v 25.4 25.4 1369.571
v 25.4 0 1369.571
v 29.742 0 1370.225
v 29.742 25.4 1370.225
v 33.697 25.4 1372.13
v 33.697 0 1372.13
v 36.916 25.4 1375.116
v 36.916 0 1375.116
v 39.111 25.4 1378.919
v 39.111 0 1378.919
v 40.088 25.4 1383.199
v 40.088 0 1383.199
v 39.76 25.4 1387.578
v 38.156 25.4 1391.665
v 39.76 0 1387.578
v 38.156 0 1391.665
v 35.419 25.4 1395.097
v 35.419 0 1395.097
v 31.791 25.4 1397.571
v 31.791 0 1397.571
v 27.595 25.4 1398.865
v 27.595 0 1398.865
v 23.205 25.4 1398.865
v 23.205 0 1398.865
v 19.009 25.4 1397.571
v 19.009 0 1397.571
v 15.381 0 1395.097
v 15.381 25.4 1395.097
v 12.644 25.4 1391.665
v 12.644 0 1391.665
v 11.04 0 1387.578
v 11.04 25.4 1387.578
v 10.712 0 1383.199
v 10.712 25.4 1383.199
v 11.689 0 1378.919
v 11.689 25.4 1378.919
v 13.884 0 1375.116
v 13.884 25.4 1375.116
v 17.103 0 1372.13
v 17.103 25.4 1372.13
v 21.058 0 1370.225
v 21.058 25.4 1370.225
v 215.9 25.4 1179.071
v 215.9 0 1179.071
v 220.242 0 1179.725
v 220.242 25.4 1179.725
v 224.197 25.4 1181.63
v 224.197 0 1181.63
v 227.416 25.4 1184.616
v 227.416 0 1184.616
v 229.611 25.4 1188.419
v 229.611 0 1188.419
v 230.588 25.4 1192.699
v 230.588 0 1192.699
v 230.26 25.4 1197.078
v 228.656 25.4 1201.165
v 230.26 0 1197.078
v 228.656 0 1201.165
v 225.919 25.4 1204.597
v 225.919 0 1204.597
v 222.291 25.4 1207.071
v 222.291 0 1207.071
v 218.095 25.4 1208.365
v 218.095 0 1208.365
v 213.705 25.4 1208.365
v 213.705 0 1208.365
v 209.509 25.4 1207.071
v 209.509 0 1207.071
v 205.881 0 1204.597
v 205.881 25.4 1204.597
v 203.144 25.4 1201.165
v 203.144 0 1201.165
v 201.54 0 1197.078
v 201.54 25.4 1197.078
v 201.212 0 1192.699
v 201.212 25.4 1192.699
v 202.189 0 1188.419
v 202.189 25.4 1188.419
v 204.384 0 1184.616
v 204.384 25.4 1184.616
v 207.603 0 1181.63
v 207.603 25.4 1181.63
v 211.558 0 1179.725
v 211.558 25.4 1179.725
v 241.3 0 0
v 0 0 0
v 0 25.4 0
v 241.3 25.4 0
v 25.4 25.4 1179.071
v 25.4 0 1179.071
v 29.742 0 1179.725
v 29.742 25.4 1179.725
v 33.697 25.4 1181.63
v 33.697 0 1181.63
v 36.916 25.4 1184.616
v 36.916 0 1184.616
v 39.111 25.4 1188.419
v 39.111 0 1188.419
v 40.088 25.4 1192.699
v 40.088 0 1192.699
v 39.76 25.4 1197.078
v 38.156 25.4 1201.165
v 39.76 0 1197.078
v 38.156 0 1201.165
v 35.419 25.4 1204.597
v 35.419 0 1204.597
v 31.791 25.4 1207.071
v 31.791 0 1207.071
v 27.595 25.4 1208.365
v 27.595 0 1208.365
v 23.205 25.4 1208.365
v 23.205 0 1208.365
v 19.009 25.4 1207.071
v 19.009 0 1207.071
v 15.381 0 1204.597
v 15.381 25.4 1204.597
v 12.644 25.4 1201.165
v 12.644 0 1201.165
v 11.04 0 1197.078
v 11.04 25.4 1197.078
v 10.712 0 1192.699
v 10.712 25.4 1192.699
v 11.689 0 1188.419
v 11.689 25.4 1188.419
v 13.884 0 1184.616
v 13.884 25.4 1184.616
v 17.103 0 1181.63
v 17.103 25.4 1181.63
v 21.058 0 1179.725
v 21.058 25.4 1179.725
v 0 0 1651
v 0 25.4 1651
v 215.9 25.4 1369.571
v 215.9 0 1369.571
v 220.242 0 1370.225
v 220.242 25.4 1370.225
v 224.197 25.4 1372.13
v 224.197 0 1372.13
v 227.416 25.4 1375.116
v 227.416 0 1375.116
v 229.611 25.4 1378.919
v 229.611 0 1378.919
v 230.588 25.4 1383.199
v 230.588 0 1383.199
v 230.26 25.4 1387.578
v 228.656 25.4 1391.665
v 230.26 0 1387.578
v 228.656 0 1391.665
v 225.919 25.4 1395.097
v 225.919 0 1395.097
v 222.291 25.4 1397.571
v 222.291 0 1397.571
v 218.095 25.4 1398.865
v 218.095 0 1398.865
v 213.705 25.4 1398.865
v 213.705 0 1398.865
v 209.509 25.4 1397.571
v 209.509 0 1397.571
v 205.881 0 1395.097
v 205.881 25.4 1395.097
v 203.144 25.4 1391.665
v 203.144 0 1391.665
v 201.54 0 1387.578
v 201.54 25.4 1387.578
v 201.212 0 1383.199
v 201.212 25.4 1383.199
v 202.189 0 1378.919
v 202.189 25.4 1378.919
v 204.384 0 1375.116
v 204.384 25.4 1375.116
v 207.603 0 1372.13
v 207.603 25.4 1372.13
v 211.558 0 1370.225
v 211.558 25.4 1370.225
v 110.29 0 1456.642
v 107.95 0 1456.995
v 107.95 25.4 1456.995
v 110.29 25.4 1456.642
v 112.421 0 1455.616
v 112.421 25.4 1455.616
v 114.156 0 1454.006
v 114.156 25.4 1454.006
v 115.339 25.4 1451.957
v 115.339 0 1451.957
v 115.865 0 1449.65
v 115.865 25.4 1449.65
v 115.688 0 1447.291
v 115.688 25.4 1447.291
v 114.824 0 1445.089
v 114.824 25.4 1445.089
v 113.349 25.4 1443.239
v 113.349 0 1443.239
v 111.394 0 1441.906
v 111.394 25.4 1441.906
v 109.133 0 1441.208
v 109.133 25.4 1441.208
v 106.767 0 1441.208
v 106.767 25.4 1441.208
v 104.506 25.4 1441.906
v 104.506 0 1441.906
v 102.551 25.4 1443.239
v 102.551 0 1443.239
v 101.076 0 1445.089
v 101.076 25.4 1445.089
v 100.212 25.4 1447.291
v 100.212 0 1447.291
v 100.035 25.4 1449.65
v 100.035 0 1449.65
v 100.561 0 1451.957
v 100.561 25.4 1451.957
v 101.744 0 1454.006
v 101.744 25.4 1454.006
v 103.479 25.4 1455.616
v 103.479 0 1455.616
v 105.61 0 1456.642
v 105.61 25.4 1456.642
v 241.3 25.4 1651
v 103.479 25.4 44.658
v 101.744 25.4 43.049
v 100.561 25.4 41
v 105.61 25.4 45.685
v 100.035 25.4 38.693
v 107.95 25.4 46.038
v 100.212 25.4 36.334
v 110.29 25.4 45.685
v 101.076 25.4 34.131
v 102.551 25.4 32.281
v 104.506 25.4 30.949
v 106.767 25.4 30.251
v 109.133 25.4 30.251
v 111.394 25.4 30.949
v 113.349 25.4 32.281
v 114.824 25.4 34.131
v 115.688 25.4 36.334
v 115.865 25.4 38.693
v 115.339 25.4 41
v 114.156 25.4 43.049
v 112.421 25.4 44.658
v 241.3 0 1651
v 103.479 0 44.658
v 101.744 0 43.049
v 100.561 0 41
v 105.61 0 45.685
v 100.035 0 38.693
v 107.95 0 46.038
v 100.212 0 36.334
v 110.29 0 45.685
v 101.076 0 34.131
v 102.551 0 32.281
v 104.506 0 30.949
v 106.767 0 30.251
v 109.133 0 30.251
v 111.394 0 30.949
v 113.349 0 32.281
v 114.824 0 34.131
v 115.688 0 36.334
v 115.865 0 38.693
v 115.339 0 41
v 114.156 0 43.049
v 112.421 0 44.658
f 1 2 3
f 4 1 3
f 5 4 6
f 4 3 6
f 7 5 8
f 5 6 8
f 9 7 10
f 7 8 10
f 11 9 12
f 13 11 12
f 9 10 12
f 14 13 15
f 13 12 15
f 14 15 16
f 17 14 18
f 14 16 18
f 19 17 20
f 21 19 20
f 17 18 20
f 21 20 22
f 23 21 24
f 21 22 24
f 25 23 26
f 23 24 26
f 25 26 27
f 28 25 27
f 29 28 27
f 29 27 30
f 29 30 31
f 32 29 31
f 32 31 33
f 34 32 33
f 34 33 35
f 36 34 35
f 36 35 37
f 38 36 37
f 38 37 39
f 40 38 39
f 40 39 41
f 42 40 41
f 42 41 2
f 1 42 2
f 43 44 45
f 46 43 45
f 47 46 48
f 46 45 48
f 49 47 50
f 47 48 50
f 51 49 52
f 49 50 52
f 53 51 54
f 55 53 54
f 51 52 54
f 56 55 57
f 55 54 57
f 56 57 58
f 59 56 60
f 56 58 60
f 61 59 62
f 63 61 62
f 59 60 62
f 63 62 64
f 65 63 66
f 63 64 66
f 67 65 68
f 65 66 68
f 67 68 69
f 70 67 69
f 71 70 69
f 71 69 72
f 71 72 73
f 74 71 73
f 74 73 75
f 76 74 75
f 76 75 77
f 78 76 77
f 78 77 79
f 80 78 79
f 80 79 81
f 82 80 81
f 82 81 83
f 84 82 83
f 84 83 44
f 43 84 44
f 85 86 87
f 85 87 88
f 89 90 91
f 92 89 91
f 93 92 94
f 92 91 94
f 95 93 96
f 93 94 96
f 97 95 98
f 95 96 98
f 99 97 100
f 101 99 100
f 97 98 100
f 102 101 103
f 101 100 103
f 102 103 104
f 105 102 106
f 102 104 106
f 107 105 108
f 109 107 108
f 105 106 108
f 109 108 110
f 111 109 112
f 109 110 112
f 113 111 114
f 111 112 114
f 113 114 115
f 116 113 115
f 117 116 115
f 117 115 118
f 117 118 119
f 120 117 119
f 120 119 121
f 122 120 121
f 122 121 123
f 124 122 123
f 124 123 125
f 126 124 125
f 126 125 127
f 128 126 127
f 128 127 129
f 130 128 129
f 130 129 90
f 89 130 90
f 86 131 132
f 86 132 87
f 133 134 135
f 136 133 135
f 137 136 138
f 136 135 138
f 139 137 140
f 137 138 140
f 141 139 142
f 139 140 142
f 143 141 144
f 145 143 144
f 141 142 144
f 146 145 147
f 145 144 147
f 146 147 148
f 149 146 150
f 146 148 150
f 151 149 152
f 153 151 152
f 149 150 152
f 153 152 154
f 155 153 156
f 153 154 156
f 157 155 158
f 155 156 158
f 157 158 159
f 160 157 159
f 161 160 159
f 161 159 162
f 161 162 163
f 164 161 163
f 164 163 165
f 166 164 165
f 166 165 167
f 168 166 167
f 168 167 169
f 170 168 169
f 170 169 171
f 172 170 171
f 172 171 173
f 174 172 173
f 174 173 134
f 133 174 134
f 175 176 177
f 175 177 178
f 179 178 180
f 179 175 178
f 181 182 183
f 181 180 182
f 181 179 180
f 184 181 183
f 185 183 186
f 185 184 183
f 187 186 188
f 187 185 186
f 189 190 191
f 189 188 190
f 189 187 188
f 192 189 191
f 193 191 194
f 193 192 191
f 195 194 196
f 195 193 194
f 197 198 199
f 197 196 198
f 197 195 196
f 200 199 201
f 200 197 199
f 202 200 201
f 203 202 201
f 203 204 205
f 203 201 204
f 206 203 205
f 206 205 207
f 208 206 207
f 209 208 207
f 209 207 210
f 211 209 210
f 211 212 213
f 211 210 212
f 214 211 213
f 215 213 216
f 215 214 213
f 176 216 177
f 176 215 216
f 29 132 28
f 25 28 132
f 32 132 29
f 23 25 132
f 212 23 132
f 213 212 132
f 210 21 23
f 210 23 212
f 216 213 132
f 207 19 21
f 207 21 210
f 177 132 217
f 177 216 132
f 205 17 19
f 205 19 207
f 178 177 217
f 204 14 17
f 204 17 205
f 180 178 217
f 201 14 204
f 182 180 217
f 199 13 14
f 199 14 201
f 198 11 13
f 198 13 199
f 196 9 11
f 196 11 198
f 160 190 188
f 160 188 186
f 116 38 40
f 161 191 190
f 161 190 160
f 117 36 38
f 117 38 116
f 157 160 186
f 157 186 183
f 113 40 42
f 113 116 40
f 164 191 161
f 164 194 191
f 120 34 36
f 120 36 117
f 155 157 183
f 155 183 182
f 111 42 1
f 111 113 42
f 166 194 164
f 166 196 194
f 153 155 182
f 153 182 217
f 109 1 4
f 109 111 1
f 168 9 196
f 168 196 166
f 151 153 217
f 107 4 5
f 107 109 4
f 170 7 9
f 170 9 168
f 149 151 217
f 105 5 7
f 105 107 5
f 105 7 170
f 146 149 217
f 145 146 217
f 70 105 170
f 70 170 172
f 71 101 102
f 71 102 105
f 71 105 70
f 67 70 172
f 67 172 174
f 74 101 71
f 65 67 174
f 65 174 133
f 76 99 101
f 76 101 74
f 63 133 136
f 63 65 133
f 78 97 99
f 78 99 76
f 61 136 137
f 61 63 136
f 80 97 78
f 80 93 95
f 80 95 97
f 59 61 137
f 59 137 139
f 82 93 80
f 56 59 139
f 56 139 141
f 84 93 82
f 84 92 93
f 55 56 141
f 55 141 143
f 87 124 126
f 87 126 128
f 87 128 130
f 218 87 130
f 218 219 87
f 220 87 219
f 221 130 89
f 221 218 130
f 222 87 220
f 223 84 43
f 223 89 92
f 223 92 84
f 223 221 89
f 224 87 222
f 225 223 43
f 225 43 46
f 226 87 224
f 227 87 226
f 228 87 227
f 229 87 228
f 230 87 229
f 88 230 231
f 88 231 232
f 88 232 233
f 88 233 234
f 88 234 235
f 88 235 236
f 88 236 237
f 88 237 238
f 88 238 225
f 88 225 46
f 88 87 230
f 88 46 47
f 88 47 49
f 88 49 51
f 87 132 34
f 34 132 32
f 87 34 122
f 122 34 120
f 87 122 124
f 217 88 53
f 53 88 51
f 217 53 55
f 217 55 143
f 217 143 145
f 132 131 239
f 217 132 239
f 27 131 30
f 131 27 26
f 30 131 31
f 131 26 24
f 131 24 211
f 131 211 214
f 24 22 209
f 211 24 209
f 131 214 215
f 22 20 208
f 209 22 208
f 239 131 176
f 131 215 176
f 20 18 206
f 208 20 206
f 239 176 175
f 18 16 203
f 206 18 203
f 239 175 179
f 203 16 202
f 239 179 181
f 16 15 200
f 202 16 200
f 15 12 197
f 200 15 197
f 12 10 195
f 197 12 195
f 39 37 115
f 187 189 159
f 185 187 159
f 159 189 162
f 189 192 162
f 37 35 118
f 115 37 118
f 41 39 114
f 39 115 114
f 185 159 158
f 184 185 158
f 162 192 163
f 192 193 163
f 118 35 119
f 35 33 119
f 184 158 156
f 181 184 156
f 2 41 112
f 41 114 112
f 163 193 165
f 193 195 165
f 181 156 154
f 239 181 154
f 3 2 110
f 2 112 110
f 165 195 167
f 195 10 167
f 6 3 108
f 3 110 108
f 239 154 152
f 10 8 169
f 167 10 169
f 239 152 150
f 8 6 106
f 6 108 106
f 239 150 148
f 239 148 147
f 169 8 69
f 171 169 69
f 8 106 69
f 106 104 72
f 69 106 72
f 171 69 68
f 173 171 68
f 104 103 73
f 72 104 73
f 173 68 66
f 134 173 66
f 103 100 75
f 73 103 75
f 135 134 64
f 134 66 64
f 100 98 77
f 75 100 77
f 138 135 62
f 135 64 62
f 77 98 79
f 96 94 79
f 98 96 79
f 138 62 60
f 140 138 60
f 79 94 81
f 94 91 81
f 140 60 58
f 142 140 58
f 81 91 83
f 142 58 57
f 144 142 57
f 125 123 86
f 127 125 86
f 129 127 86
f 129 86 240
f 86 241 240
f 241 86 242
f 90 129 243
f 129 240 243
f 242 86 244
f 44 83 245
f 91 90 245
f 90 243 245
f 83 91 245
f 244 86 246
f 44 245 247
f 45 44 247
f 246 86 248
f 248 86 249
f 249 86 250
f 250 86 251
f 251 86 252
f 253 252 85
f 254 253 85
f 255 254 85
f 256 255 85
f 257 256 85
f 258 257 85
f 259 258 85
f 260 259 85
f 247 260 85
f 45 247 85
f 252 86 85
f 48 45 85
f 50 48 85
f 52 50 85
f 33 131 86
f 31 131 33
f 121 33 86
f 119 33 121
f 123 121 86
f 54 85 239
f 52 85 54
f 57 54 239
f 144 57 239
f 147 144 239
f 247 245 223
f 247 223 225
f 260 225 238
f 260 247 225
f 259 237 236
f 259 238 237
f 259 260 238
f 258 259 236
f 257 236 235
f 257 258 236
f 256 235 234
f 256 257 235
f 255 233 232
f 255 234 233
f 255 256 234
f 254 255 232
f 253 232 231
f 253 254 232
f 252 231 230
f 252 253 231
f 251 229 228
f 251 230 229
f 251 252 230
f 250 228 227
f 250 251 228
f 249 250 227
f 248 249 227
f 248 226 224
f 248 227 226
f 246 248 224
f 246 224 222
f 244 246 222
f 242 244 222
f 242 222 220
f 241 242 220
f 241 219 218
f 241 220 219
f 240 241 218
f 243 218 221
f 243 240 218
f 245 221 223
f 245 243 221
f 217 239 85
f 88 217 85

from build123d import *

# Parameters (mm, degrees)
SKETCH1_W               = 241.3
SKETCH1_H               = 1651
BOSS_EXTRUDE1_DEPTH     = 25.4
CUT_EXTRUDE1_DEPTH      = 1669.733606661
CUT_EXTRUDE1_DEPTH_BACK = 1669.733606661
SKETCH2_R               = 7.9375
SKETCH3_R               = 14.72946
CUT_EXTRUDE2_DEPTH      = 1669.733606661


with BuildPart() as part:
    # Sketch1 → Boss-Extrude1 (new body)
    with BuildSketch(Plane(origin=(0, 0, 0), x_dir=(1, 0, 0), z_dir=(0, 1, 0))):
        with Locations((120.65, -825.5)):
            Rectangle(SKETCH1_W, SKETCH1_H)
    extrude(amount=BOSS_EXTRUDE1_DEPTH)

    # Sketch2 → Cut-Extrude1 (cut, two sides: drawn at the far end of the back side and taken through both)
    with BuildSketch(Plane(origin=(0, 25.4, 0), x_dir=(1, 0, 0), z_dir=(0, 1, 0)).offset(-CUT_EXTRUDE1_DEPTH_BACK)):
        with Locations(Location((107.95, -38.1, 0), (0, 0, 270))):
            Circle(SKETCH2_R)
        with Locations(Location((107.95, -1449.0573, 0), (0, 0, 270))):
            Circle(SKETCH2_R)
    extrude(amount=CUT_EXTRUDE1_DEPTH + CUT_EXTRUDE1_DEPTH_BACK, mode=Mode.SUBTRACT)

    # Sketch3 → Cut-Extrude2 (cut, through all)
    with BuildSketch(Plane.XZ):
        with Locations(Location((215.9, 1193.8, 0), (0, 0, 270))):
            Circle(SKETCH3_R)
        with Locations(Location((25.4, 1193.8, 0), (0, 0, 270))):
            Circle(SKETCH3_R)
        with Locations(Location((25.4, 1384.3, 0), (0, 0, 270))):
            Circle(SKETCH3_R)
        with Locations(Location((215.9, 1384.3, 0), (0, 0, 270))):
            Circle(SKETCH3_R)
    extrude(amount=-CUT_EXTRUDE2_DEPTH, mode=Mode.SUBTRACT)


solid = part.part
